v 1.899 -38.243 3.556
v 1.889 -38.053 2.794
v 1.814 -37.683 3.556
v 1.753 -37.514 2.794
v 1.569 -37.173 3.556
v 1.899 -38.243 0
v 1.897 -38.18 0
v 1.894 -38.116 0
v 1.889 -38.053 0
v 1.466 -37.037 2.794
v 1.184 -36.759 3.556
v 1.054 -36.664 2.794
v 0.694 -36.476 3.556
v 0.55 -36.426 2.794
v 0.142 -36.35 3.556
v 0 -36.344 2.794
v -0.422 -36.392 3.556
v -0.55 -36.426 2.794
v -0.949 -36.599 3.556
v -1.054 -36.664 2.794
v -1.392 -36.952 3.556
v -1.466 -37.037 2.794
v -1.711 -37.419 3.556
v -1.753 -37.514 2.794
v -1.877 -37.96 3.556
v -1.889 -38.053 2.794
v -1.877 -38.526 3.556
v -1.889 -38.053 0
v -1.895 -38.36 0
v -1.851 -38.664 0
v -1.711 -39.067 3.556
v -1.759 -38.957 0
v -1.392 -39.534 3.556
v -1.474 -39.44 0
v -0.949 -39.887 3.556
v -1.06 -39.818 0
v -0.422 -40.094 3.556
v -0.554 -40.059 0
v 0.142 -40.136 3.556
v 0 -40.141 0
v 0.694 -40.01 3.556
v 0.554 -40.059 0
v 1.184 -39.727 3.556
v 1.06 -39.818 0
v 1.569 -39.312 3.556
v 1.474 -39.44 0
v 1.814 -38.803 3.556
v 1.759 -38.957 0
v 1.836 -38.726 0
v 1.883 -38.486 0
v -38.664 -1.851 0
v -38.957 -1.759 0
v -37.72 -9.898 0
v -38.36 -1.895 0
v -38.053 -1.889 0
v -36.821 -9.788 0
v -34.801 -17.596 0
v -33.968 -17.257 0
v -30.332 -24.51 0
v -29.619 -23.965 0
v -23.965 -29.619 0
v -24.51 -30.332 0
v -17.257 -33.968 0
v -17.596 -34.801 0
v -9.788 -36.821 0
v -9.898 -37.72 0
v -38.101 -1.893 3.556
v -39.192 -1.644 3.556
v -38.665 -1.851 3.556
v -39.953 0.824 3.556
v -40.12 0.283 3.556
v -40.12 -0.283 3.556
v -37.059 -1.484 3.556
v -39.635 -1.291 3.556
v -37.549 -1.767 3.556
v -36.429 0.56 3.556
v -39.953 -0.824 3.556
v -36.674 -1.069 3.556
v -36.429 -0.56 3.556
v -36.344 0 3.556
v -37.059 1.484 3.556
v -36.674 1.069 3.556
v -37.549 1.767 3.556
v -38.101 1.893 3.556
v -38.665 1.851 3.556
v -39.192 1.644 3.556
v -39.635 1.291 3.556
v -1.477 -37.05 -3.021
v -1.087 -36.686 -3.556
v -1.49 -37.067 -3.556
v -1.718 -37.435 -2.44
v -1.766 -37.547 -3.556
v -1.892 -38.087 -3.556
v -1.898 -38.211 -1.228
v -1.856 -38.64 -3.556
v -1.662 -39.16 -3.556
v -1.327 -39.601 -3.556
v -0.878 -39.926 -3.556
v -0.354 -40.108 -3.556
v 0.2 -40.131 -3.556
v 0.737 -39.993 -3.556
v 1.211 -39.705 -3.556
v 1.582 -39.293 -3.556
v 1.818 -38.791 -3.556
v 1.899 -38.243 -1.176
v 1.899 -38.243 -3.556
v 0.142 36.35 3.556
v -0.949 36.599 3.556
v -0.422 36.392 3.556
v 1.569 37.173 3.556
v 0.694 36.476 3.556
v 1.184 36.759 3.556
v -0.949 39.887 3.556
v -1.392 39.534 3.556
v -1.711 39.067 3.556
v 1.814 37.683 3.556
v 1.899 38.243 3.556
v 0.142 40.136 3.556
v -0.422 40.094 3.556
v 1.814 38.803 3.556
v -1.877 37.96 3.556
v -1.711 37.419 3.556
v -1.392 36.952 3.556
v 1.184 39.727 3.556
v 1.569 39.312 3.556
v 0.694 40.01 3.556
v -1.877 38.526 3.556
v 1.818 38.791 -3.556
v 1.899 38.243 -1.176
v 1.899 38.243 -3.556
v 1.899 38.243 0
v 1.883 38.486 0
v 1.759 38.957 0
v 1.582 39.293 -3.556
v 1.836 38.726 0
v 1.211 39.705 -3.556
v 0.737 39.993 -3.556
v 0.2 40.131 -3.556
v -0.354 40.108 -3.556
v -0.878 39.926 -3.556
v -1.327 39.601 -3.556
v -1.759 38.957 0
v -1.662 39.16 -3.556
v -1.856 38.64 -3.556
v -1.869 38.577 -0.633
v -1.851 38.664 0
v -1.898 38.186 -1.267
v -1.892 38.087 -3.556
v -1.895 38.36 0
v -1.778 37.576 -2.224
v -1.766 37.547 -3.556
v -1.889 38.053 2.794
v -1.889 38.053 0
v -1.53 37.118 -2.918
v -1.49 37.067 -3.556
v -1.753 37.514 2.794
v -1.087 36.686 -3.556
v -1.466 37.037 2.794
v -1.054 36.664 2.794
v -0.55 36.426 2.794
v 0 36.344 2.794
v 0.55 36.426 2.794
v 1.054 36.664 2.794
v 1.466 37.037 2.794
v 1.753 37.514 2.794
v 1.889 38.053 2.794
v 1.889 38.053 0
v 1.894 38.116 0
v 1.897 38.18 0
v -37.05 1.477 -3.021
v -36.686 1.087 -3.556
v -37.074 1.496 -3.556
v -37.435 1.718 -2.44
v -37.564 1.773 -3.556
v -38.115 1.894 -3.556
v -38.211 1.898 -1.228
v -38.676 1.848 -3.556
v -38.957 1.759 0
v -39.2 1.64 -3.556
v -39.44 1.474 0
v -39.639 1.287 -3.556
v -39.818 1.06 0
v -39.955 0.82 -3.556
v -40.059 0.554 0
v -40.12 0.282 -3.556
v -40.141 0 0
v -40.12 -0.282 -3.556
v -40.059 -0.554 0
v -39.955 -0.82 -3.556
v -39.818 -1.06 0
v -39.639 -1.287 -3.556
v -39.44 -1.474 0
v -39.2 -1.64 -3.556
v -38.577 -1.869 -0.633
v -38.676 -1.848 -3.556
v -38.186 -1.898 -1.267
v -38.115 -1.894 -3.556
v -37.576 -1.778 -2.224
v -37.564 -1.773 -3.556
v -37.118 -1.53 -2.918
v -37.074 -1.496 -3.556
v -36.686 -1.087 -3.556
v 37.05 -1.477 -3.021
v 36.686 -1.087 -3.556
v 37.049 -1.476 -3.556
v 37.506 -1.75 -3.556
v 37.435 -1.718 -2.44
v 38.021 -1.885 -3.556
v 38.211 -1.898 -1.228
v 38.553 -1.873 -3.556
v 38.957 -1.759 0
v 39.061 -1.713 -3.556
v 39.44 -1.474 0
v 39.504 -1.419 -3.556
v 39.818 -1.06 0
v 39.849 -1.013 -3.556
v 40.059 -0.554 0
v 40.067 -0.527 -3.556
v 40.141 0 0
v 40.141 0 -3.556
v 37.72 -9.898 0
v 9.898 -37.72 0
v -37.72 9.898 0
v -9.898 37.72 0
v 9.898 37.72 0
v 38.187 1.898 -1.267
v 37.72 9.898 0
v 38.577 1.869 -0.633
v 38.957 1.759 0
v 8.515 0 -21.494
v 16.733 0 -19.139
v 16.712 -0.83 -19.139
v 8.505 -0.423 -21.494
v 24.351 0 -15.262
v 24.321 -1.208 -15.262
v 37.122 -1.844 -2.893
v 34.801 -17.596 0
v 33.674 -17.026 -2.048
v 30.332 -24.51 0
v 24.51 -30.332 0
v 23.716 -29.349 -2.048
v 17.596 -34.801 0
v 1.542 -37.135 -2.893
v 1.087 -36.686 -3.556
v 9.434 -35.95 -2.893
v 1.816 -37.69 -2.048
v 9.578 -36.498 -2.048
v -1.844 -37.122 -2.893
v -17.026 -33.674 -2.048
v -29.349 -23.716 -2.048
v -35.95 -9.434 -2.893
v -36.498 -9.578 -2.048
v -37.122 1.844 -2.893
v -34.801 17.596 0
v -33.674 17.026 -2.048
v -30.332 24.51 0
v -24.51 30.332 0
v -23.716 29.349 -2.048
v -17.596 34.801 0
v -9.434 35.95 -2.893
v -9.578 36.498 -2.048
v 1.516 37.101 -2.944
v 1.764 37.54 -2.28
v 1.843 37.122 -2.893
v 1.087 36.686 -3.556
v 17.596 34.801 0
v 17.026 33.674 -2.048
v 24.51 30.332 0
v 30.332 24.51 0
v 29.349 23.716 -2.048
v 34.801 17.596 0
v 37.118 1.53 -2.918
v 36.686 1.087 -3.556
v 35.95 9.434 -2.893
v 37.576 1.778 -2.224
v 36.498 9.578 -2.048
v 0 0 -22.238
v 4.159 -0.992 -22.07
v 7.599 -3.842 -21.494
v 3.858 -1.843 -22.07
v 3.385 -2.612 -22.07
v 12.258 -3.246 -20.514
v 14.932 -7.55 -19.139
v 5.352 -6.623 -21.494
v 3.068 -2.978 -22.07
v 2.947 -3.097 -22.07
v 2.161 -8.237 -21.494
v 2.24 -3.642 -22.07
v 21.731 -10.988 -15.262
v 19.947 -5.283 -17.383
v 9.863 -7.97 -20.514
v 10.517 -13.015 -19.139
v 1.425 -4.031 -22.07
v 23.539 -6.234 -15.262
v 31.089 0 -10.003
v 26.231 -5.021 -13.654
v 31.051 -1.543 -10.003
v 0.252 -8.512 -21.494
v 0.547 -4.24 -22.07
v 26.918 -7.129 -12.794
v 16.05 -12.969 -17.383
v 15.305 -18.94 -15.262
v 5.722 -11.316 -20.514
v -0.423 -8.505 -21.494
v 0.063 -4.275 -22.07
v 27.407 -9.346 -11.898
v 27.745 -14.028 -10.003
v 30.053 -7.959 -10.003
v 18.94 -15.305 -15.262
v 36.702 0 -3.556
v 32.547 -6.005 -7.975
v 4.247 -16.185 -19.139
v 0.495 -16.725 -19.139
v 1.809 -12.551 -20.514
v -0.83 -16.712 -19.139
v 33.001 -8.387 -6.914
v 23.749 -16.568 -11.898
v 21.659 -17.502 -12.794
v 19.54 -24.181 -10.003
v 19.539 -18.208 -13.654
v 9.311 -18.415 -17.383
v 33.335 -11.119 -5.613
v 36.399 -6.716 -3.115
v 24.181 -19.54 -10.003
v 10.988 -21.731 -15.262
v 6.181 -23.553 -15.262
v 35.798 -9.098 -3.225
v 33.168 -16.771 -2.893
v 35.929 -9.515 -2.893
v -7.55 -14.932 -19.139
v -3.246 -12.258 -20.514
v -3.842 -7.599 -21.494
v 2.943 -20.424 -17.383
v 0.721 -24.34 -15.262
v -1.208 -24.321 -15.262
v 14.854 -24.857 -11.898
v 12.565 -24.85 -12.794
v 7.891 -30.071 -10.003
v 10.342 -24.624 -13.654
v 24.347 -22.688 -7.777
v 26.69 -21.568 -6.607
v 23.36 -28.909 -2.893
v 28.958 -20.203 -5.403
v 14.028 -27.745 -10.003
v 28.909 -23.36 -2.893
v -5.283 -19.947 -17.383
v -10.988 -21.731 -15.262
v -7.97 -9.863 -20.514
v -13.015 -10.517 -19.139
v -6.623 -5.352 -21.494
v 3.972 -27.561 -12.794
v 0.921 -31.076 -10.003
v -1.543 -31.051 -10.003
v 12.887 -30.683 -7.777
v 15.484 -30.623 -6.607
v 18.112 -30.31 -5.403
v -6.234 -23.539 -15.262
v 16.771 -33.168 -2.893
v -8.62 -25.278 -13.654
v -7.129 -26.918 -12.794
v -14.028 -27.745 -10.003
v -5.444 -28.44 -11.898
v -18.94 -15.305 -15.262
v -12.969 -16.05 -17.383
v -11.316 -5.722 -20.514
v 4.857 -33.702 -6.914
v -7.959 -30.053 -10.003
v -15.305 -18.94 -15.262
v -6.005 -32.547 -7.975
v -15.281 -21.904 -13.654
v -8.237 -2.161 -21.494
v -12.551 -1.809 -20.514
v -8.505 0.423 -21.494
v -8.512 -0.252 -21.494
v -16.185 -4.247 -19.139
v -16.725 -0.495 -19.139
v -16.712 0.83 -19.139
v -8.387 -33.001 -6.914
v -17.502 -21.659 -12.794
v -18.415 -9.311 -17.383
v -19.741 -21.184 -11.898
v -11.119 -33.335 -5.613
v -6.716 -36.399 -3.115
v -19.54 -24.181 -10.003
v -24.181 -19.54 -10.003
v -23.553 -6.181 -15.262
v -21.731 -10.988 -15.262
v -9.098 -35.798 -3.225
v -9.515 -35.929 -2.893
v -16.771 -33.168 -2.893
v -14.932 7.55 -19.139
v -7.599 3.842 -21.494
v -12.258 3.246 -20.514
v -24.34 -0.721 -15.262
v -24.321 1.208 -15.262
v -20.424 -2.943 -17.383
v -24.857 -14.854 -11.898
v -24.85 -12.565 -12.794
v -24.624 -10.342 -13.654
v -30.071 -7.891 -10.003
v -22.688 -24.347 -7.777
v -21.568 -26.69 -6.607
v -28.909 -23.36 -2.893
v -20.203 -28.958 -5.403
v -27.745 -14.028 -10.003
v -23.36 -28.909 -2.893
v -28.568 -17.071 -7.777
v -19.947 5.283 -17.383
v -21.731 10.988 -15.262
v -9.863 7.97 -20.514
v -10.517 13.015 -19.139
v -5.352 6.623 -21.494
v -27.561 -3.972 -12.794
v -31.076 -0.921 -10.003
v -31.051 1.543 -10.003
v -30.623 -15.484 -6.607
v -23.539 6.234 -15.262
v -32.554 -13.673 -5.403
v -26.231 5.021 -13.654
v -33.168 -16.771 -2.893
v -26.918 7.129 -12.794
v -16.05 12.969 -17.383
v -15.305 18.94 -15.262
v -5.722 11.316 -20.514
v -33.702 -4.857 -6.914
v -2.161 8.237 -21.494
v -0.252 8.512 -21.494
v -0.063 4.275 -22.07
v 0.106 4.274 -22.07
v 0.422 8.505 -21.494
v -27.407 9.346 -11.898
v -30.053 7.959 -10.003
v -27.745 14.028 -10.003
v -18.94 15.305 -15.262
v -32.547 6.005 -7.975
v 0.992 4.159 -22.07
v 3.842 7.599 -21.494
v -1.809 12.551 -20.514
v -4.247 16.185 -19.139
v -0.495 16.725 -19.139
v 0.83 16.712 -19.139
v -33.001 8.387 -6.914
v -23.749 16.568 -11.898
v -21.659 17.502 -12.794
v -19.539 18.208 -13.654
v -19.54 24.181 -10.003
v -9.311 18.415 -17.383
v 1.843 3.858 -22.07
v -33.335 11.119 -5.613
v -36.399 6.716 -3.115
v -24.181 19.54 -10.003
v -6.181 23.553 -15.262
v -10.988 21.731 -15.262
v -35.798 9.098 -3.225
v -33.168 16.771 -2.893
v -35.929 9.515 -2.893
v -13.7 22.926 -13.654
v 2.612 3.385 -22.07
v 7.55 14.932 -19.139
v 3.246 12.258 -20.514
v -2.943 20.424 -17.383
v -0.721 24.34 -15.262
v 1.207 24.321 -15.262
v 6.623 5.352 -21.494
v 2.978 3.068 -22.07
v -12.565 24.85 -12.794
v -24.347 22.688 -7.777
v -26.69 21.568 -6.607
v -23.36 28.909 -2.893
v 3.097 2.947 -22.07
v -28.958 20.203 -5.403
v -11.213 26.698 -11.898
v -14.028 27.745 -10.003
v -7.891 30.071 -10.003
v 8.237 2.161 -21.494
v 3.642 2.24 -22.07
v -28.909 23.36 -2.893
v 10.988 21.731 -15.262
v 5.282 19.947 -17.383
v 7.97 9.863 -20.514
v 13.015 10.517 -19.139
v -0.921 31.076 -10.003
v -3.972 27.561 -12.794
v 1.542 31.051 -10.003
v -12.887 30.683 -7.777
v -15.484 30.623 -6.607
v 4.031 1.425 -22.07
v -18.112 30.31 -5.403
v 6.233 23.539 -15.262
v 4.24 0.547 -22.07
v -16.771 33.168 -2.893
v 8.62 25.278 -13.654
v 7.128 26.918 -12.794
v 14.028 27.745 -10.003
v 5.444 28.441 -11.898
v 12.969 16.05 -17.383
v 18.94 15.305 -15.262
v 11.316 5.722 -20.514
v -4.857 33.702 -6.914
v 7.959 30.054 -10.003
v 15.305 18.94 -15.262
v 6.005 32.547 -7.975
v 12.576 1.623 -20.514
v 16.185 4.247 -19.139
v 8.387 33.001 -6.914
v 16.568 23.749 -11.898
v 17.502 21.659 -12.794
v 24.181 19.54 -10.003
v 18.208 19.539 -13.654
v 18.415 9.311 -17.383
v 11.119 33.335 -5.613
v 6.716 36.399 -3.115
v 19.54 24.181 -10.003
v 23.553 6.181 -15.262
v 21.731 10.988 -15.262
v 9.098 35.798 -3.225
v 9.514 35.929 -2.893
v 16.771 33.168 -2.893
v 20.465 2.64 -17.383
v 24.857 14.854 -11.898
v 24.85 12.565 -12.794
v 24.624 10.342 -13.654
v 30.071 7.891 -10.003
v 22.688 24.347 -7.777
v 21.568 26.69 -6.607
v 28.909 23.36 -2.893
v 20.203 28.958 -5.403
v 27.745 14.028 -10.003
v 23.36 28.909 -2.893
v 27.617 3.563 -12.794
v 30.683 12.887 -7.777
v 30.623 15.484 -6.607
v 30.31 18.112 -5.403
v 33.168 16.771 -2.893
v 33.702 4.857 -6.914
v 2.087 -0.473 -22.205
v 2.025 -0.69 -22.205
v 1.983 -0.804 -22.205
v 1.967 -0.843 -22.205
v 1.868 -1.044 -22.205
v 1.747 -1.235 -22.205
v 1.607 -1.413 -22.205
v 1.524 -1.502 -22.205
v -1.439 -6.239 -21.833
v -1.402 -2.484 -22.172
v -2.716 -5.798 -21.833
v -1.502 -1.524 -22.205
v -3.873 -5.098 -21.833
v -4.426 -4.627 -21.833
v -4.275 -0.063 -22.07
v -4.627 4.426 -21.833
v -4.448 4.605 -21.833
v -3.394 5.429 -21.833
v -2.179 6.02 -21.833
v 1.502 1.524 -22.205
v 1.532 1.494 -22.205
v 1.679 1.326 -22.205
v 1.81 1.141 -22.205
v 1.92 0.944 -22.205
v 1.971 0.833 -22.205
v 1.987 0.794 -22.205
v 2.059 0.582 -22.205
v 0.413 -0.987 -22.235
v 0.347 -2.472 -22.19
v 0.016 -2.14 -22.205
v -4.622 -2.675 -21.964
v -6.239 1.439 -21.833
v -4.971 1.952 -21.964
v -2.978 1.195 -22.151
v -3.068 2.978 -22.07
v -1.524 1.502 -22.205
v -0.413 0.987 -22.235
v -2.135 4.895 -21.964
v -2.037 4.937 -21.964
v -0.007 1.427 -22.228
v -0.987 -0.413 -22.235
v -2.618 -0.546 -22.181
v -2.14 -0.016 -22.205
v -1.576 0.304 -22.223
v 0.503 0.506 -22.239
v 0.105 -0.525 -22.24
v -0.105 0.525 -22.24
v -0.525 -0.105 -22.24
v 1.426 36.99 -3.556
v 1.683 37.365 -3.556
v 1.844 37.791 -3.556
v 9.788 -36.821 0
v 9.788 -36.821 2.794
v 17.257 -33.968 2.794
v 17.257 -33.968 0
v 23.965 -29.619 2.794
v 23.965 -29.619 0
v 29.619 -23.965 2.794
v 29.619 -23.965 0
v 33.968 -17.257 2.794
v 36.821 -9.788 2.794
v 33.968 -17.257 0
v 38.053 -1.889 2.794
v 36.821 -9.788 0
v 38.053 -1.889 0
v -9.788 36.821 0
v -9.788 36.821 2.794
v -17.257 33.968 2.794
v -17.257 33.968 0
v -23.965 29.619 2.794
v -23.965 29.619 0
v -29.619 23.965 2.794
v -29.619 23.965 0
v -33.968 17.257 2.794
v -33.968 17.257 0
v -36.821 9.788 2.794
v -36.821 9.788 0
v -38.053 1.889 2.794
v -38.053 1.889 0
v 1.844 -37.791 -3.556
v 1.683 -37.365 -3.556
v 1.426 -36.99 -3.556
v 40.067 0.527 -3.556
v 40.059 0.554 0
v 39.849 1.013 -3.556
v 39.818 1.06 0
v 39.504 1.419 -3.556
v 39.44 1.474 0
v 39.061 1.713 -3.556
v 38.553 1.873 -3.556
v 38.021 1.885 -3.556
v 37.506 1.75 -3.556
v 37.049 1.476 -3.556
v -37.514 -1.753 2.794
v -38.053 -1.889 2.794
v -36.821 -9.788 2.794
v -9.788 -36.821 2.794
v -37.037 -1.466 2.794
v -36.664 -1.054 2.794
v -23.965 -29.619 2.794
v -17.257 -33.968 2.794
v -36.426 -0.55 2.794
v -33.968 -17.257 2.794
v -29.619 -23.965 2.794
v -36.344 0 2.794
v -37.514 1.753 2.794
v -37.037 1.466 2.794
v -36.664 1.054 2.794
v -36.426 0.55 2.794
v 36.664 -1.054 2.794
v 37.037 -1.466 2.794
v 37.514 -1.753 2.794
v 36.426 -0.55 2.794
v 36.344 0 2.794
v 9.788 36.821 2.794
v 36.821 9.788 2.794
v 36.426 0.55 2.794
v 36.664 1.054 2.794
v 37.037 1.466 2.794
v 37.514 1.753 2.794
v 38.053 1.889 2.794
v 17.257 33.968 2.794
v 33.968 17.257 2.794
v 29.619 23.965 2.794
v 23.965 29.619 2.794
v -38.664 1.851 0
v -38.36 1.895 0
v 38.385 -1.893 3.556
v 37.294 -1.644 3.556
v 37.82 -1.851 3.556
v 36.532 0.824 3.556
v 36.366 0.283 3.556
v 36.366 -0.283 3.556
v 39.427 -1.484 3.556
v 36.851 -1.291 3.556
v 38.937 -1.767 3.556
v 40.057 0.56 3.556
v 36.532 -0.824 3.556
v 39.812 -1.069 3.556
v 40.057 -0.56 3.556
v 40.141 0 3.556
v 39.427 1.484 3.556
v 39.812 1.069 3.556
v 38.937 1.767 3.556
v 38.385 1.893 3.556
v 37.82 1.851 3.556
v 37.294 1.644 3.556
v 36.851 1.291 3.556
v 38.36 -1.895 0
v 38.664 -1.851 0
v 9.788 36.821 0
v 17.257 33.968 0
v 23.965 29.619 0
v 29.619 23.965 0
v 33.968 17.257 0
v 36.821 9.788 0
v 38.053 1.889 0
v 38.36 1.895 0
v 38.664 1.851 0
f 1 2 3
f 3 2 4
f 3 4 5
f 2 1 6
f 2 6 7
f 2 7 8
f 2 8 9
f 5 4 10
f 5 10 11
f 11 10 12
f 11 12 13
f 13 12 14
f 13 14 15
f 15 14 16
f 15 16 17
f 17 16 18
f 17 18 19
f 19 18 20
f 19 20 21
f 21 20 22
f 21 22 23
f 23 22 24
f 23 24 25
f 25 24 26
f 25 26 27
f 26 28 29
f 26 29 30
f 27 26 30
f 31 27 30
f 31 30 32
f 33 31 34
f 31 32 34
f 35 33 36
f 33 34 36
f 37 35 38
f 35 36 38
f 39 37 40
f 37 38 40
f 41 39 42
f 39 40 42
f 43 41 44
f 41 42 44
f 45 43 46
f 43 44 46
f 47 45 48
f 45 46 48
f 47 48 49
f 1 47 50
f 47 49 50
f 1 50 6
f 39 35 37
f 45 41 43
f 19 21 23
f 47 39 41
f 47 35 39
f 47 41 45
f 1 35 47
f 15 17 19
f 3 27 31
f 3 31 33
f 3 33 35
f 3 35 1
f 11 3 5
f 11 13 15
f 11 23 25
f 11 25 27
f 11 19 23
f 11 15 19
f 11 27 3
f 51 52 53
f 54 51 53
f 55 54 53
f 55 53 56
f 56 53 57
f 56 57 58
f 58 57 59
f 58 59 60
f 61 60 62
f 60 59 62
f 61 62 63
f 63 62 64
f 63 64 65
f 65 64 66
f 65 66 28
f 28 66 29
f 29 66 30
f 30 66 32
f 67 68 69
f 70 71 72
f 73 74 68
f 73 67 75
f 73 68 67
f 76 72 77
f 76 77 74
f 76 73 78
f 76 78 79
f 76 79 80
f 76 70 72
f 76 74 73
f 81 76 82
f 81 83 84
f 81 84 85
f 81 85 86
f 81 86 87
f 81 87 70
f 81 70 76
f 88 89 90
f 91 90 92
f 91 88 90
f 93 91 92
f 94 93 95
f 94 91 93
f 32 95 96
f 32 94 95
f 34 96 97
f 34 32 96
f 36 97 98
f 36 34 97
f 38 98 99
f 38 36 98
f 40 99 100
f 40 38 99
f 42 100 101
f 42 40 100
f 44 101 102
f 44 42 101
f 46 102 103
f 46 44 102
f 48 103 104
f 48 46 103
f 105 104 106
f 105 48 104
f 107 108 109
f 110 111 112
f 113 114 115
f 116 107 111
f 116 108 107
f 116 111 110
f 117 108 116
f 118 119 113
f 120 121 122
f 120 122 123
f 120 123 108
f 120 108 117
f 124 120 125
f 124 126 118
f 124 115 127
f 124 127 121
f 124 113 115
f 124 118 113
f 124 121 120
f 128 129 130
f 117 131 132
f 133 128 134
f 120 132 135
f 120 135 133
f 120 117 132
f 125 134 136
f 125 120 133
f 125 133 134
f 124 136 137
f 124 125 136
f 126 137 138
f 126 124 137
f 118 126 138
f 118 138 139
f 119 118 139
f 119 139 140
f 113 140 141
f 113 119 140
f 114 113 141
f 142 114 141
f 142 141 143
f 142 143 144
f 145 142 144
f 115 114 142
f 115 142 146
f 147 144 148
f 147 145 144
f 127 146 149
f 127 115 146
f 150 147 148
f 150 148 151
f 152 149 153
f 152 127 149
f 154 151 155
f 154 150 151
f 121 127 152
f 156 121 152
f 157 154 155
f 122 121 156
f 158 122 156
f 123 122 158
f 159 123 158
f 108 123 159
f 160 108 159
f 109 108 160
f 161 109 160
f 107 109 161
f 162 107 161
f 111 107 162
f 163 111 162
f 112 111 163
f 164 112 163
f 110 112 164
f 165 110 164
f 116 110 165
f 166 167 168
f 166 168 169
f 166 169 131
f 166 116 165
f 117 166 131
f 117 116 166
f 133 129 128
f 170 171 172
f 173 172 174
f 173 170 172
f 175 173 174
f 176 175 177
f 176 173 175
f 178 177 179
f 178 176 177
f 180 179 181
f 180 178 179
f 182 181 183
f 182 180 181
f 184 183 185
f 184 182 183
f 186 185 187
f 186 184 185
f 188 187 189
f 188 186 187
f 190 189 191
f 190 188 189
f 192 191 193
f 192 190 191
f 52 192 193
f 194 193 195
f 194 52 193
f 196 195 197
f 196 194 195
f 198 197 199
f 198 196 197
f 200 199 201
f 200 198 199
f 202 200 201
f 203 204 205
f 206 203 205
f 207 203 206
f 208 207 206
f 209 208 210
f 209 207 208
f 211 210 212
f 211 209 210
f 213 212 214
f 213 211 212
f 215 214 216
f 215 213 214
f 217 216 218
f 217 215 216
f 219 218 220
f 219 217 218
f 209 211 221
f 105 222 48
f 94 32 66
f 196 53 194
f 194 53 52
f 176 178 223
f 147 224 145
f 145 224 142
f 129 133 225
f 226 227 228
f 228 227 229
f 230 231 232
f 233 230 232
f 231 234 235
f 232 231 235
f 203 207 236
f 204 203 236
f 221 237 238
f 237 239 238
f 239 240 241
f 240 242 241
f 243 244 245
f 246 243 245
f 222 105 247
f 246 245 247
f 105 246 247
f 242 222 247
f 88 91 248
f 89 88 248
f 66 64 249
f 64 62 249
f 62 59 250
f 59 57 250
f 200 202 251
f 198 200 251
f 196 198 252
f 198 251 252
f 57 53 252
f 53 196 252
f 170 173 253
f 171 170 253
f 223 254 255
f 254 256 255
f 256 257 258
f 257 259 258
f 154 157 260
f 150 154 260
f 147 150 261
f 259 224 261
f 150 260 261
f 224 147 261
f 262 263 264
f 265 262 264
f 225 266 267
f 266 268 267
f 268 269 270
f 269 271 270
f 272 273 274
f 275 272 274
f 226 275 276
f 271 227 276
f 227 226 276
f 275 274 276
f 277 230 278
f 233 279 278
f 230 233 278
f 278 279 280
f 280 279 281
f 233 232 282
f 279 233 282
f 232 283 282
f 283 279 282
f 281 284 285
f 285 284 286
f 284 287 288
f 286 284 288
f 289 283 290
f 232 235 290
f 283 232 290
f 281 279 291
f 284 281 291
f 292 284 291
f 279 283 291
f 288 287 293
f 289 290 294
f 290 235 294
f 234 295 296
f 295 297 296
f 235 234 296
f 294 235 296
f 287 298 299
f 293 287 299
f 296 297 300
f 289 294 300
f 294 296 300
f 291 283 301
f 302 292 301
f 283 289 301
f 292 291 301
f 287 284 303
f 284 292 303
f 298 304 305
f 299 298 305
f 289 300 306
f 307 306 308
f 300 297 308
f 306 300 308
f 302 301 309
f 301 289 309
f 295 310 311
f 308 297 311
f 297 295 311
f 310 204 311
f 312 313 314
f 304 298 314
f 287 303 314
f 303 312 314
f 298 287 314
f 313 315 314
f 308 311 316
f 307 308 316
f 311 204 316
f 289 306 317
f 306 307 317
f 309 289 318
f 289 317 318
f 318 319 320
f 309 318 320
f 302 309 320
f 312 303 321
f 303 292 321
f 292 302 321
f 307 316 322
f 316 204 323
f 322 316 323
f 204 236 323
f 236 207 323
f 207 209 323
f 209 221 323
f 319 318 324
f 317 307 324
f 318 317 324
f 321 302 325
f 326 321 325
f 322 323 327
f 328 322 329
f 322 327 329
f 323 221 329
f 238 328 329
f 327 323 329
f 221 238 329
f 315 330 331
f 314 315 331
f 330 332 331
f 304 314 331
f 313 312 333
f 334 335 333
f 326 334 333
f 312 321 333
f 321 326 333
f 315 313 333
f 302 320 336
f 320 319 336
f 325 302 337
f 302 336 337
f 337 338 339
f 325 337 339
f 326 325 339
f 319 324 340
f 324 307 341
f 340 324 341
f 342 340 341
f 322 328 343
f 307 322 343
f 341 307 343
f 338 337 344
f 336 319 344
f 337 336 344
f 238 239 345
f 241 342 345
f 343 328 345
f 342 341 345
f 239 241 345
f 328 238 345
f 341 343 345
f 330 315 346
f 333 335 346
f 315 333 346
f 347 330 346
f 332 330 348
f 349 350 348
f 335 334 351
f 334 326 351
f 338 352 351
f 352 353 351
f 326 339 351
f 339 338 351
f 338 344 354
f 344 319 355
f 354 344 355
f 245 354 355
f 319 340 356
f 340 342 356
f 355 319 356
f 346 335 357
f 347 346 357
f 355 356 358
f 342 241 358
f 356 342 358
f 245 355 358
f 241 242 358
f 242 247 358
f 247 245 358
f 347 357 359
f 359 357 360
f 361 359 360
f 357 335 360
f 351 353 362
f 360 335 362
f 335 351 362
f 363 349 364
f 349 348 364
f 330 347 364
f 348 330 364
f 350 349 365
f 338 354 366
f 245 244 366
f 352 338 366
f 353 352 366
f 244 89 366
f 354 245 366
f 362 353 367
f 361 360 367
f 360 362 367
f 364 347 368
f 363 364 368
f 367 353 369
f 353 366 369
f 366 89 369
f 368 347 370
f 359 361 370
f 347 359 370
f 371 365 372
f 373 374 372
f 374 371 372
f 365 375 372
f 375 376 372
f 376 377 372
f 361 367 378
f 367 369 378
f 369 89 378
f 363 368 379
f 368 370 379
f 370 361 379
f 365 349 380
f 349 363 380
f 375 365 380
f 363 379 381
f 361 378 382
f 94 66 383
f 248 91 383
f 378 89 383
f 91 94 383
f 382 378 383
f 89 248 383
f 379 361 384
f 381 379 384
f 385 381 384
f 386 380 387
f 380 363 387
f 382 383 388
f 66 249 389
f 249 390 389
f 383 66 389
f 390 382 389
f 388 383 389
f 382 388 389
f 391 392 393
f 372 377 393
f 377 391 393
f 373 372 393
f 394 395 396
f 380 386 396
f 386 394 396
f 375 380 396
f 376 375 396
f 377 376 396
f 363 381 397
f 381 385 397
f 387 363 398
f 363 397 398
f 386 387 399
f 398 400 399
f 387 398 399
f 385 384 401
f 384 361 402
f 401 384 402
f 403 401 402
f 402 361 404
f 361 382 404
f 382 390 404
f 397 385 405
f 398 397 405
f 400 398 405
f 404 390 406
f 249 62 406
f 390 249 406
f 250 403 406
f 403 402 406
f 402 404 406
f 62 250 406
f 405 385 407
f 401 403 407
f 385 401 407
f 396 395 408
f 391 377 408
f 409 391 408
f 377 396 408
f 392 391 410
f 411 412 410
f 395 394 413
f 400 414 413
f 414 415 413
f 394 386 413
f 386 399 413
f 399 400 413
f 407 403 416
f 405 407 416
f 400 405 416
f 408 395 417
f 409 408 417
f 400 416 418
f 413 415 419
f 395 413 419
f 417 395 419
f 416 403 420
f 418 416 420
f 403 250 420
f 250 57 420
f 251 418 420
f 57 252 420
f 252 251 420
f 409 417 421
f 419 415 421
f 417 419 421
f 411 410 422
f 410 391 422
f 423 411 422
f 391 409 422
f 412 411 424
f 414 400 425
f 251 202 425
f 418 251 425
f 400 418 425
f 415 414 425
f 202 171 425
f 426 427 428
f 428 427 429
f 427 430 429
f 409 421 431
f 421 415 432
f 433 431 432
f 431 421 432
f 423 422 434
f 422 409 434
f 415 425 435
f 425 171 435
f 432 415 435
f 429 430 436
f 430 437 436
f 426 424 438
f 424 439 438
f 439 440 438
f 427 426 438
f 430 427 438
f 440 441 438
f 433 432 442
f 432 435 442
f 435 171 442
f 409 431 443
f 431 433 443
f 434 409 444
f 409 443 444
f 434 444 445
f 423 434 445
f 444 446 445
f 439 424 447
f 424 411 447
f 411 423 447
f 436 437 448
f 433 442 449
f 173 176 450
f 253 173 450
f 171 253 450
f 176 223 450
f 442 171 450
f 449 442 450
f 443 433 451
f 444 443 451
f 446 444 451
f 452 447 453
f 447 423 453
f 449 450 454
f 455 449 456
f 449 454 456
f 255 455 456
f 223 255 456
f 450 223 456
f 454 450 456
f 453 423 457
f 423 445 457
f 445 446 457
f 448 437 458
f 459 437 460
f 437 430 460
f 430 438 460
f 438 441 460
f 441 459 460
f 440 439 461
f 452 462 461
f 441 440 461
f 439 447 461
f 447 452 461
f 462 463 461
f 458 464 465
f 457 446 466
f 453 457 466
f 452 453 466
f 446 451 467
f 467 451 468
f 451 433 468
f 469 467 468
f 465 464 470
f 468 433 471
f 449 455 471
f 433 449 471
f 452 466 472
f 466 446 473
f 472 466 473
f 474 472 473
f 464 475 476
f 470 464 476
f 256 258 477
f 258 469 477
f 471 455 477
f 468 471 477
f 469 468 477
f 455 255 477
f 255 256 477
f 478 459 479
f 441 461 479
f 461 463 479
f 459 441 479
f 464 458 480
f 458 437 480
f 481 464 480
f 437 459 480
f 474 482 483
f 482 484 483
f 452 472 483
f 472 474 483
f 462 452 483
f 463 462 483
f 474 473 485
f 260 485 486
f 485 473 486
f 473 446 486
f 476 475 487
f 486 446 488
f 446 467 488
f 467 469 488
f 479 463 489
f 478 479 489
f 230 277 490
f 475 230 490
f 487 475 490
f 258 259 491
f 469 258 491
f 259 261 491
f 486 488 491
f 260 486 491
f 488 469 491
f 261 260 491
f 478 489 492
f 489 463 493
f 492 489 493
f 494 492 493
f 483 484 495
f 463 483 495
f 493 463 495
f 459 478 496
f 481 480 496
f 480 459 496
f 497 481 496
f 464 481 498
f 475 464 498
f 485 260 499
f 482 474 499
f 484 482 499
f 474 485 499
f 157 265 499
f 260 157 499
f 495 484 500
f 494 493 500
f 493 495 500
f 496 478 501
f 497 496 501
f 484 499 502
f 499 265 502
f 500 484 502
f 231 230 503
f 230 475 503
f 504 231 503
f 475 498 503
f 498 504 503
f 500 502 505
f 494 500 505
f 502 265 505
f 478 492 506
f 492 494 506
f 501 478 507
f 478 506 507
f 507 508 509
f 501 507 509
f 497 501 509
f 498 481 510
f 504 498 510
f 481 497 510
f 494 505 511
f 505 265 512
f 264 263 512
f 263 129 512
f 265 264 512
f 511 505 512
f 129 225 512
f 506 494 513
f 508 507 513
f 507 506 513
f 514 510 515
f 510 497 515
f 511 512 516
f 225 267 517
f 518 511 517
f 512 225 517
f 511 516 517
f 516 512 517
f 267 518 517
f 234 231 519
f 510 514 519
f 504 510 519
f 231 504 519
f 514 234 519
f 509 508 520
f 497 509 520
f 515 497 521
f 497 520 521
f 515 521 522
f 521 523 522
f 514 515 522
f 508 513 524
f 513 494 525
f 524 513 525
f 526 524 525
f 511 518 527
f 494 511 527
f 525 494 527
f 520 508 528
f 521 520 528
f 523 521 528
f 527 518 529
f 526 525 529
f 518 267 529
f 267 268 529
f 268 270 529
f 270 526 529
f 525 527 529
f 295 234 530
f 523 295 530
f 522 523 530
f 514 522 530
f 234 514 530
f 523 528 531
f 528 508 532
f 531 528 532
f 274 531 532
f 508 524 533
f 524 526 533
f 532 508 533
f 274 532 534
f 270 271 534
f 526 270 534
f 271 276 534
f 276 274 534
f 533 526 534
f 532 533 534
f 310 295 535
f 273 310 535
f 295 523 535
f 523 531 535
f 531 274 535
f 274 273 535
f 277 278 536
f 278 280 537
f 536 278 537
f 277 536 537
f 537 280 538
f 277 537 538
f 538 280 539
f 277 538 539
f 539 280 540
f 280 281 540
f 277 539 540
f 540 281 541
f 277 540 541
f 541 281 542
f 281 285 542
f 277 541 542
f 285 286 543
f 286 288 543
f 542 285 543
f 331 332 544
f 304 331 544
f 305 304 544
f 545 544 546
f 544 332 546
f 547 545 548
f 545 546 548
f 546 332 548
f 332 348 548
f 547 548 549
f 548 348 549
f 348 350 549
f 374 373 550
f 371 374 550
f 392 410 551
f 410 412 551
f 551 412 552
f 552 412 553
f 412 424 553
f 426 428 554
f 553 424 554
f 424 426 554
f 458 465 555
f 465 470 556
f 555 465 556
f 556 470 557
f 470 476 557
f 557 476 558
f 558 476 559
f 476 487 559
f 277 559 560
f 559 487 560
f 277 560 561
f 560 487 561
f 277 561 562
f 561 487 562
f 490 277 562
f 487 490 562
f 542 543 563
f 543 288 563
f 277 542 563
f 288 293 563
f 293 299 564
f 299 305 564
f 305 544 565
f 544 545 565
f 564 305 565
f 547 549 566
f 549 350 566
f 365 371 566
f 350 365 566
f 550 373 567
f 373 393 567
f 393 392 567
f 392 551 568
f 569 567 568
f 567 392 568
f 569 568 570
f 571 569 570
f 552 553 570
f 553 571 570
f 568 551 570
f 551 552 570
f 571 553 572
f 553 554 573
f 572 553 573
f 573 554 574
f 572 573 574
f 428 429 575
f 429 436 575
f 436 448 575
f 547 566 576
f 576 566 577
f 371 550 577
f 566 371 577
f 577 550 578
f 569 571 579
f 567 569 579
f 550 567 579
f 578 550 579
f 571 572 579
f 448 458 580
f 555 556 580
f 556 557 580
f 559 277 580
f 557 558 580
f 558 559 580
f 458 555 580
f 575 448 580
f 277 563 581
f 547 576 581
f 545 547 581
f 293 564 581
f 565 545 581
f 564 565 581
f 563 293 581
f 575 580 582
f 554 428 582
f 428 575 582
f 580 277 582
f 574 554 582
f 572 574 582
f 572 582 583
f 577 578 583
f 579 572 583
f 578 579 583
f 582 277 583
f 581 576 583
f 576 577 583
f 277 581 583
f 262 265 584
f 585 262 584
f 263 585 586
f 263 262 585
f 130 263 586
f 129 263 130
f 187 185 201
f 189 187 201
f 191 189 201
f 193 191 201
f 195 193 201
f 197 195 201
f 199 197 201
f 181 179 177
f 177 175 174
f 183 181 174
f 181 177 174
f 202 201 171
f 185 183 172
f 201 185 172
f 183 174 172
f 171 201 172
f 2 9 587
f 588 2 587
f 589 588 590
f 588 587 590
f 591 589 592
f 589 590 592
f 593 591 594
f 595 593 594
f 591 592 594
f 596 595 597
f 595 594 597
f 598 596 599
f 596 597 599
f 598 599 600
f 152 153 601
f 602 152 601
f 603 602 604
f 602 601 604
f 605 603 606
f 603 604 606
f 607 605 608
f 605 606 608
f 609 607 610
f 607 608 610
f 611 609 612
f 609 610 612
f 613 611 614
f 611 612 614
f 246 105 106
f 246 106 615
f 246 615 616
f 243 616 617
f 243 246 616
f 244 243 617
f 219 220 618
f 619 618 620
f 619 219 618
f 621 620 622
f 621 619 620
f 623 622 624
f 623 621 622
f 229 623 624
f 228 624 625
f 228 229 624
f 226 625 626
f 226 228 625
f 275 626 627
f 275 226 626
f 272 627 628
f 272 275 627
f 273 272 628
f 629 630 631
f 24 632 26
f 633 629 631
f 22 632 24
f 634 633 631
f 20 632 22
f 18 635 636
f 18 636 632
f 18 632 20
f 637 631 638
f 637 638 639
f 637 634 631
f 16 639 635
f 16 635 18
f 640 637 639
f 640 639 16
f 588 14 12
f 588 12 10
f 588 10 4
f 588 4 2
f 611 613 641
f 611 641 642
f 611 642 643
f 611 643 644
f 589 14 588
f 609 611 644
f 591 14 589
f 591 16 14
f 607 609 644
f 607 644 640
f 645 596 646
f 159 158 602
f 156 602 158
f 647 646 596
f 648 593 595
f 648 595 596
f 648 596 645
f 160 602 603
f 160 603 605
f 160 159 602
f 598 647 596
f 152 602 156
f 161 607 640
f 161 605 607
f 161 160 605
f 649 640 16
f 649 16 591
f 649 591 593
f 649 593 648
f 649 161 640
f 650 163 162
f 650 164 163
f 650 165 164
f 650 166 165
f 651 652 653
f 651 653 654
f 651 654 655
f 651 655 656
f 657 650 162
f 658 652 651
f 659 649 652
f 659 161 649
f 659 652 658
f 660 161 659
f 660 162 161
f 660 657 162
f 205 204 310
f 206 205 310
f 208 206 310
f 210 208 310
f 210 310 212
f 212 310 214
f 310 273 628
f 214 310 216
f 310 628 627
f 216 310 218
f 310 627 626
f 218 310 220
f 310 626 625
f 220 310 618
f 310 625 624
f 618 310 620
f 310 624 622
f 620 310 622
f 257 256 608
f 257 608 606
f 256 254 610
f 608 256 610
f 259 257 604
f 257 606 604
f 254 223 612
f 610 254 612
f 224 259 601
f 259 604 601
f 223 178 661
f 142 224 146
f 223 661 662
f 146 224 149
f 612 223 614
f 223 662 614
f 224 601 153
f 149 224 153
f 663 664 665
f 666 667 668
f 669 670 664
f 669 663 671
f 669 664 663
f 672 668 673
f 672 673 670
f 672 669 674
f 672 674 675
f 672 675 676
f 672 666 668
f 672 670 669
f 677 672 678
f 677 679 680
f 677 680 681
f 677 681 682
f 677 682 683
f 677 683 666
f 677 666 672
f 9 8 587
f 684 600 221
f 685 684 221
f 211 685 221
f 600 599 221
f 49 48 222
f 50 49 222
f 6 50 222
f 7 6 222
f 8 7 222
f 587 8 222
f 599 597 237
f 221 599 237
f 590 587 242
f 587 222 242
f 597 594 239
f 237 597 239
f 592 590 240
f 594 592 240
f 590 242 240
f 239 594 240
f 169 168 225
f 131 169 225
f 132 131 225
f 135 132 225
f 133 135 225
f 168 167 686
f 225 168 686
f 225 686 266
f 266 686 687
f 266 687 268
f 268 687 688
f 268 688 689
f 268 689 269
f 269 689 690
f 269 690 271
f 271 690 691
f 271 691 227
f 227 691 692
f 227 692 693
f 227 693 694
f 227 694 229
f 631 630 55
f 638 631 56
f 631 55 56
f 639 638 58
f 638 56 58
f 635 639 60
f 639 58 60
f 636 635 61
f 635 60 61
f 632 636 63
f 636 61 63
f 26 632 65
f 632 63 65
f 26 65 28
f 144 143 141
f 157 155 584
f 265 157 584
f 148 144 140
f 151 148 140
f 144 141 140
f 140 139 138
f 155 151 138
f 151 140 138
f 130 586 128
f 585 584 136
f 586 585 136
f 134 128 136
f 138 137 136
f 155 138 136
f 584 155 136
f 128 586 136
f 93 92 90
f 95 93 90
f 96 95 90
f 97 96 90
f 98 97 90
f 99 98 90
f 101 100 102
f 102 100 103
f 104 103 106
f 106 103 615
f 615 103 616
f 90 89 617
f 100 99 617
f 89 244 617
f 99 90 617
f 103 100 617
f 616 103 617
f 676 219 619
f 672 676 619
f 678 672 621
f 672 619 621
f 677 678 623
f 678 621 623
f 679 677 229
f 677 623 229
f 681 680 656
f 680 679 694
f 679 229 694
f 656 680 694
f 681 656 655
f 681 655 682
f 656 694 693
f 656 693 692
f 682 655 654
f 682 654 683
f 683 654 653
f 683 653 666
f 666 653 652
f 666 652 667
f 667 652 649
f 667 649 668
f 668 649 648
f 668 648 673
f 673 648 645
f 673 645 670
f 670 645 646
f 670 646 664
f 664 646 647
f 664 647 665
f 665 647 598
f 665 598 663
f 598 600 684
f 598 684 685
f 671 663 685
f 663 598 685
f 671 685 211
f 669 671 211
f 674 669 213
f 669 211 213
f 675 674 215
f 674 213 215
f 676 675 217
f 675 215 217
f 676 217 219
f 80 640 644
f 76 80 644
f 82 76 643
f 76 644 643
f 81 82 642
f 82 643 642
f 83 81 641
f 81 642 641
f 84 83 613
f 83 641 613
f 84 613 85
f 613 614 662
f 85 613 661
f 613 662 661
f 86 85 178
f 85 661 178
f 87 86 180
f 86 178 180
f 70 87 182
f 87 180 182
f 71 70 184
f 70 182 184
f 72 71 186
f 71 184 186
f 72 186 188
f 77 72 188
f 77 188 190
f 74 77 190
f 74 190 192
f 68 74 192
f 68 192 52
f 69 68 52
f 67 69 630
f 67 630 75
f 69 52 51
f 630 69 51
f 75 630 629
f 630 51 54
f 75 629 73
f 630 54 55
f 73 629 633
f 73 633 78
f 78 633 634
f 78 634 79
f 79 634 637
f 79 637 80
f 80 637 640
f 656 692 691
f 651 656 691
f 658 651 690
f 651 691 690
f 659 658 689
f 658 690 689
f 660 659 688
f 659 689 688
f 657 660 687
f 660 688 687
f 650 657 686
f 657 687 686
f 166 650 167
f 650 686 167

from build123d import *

# Parameters (mm, degrees)
F3_DEPTH = 2.794
F4_R     = 1.898537
F5_DEPTH = 3.556


with BuildPart() as f2:
    # F1 (on Front) → F2 (revolve)
    with BuildSketch(Plane.XZ):
        with BuildLine():
            Line((0, 0), (0, -22.238212))
            ThreePointArc((0, -22.238212), (22.497638, -16.378549), (38.996805, 0))
            Line((38.996805, 0), (0, 0))
        make_face()
    revolve(axis=Axis((0, 0, -11.119106), (0, 0, -1)))

    # F0 (on Top) → F3 (join)
    with BuildSketch(Plane.XY):
        with BuildLine():
            Line((-38.1, 0), (38.1, 0))
            ThreePointArc((38.1, 0), (0, 38.1), (-38.1, 0))
        make_face()
        with BuildLine():
            ThreePointArc((-38.1, 0), (0, -38.1), (38.1, 0))
            Line((38.1, 0), (-38.1, 0))
        make_face()
    extrude(amount=F3_DEPTH)

    # F4 (on Top) → F5 (join, symmetric)
    with BuildSketch(Plane.XY):
        with Locations((-38.242929, 0)):
            Circle(F4_R)
        with Locations((0, -38.242929)):
            Circle(F4_R)
        with Locations((38.242929, 0)):
            Circle(F4_R)
        with Locations((0, 38.242929)):
            Circle(F4_R)
    extrude(amount=F5_DEPTH, both=True)


solid = f2.part
